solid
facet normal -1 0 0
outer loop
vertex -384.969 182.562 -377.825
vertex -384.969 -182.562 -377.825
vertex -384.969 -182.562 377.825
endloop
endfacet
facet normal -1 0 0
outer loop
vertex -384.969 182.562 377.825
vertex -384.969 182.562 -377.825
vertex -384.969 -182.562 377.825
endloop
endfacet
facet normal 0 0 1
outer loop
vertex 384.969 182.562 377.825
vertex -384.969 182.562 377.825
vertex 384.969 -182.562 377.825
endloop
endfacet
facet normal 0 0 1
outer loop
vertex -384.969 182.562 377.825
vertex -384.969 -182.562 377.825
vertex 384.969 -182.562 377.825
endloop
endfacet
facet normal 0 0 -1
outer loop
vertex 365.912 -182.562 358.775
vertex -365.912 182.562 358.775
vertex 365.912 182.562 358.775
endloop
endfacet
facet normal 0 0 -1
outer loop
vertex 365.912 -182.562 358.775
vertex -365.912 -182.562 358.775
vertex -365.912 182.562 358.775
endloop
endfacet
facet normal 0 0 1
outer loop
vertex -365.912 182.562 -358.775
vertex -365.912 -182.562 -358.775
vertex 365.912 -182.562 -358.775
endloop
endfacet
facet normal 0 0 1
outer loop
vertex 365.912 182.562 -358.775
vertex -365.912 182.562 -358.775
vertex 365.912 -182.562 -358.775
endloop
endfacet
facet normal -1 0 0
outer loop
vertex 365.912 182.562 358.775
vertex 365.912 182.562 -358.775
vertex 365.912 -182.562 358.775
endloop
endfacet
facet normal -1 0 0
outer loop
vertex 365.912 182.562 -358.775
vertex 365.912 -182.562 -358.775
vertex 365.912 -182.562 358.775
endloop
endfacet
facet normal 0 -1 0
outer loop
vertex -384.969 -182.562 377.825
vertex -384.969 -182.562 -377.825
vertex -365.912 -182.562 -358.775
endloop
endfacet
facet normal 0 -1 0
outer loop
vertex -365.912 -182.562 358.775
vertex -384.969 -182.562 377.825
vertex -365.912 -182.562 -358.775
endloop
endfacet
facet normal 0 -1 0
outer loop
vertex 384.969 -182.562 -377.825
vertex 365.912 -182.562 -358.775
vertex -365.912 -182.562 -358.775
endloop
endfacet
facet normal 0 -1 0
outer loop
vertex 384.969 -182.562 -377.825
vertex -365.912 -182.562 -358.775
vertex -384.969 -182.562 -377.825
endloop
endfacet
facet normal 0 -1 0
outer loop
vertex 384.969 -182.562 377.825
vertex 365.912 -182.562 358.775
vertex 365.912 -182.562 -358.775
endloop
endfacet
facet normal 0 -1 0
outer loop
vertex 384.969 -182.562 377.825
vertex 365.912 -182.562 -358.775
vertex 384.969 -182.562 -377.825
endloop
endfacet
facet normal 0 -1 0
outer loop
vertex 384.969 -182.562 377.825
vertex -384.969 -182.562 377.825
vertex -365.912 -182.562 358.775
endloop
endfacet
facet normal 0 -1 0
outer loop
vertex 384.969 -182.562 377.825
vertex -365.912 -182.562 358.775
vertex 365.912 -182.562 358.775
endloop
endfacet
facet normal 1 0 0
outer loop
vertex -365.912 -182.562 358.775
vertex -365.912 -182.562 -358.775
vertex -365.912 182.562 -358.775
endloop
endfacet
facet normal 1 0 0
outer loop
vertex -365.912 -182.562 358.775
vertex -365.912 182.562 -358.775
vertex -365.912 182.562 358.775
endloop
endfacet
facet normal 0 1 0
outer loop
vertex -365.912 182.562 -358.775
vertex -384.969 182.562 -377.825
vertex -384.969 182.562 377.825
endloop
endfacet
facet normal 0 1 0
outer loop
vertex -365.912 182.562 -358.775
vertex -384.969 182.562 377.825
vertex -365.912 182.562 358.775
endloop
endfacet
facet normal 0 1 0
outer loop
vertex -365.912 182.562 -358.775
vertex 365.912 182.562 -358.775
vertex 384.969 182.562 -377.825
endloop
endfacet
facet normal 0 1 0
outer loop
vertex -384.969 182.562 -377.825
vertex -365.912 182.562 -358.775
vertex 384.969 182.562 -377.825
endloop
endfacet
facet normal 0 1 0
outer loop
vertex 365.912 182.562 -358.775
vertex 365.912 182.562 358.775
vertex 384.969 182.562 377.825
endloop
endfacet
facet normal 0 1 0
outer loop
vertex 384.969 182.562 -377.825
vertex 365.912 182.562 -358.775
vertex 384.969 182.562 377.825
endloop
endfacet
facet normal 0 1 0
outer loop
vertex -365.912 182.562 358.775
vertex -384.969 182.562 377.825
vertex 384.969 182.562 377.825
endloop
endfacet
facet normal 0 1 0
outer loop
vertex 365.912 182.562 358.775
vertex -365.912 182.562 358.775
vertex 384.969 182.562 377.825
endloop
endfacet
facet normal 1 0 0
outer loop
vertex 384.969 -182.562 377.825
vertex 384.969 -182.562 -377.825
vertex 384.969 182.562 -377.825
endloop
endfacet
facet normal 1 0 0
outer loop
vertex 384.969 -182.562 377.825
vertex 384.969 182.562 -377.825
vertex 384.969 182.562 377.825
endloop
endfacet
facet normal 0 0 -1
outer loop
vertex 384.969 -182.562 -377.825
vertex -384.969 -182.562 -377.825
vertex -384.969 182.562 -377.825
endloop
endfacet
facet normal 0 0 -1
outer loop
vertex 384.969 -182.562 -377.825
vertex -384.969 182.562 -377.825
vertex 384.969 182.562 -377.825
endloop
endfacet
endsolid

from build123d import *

# Parameters (mm, degrees)
F1_W     = 769.9375
F1_H     = 755.65
F1_W_2   = 731.8248
F1_H_2   = 717.55
F2_DEPTH = 182.5625


with BuildPart() as f2:
    # F1 (on face) → F2 (new body, symmetric)
    with BuildSketch(Plane.XZ):
        Rectangle(F1_W, F1_H)
        Rectangle(F1_W_2, F1_H_2, mode=Mode.SUBTRACT)
    extrude(amount=F2_DEPTH, both=True)


solid = f2.part
